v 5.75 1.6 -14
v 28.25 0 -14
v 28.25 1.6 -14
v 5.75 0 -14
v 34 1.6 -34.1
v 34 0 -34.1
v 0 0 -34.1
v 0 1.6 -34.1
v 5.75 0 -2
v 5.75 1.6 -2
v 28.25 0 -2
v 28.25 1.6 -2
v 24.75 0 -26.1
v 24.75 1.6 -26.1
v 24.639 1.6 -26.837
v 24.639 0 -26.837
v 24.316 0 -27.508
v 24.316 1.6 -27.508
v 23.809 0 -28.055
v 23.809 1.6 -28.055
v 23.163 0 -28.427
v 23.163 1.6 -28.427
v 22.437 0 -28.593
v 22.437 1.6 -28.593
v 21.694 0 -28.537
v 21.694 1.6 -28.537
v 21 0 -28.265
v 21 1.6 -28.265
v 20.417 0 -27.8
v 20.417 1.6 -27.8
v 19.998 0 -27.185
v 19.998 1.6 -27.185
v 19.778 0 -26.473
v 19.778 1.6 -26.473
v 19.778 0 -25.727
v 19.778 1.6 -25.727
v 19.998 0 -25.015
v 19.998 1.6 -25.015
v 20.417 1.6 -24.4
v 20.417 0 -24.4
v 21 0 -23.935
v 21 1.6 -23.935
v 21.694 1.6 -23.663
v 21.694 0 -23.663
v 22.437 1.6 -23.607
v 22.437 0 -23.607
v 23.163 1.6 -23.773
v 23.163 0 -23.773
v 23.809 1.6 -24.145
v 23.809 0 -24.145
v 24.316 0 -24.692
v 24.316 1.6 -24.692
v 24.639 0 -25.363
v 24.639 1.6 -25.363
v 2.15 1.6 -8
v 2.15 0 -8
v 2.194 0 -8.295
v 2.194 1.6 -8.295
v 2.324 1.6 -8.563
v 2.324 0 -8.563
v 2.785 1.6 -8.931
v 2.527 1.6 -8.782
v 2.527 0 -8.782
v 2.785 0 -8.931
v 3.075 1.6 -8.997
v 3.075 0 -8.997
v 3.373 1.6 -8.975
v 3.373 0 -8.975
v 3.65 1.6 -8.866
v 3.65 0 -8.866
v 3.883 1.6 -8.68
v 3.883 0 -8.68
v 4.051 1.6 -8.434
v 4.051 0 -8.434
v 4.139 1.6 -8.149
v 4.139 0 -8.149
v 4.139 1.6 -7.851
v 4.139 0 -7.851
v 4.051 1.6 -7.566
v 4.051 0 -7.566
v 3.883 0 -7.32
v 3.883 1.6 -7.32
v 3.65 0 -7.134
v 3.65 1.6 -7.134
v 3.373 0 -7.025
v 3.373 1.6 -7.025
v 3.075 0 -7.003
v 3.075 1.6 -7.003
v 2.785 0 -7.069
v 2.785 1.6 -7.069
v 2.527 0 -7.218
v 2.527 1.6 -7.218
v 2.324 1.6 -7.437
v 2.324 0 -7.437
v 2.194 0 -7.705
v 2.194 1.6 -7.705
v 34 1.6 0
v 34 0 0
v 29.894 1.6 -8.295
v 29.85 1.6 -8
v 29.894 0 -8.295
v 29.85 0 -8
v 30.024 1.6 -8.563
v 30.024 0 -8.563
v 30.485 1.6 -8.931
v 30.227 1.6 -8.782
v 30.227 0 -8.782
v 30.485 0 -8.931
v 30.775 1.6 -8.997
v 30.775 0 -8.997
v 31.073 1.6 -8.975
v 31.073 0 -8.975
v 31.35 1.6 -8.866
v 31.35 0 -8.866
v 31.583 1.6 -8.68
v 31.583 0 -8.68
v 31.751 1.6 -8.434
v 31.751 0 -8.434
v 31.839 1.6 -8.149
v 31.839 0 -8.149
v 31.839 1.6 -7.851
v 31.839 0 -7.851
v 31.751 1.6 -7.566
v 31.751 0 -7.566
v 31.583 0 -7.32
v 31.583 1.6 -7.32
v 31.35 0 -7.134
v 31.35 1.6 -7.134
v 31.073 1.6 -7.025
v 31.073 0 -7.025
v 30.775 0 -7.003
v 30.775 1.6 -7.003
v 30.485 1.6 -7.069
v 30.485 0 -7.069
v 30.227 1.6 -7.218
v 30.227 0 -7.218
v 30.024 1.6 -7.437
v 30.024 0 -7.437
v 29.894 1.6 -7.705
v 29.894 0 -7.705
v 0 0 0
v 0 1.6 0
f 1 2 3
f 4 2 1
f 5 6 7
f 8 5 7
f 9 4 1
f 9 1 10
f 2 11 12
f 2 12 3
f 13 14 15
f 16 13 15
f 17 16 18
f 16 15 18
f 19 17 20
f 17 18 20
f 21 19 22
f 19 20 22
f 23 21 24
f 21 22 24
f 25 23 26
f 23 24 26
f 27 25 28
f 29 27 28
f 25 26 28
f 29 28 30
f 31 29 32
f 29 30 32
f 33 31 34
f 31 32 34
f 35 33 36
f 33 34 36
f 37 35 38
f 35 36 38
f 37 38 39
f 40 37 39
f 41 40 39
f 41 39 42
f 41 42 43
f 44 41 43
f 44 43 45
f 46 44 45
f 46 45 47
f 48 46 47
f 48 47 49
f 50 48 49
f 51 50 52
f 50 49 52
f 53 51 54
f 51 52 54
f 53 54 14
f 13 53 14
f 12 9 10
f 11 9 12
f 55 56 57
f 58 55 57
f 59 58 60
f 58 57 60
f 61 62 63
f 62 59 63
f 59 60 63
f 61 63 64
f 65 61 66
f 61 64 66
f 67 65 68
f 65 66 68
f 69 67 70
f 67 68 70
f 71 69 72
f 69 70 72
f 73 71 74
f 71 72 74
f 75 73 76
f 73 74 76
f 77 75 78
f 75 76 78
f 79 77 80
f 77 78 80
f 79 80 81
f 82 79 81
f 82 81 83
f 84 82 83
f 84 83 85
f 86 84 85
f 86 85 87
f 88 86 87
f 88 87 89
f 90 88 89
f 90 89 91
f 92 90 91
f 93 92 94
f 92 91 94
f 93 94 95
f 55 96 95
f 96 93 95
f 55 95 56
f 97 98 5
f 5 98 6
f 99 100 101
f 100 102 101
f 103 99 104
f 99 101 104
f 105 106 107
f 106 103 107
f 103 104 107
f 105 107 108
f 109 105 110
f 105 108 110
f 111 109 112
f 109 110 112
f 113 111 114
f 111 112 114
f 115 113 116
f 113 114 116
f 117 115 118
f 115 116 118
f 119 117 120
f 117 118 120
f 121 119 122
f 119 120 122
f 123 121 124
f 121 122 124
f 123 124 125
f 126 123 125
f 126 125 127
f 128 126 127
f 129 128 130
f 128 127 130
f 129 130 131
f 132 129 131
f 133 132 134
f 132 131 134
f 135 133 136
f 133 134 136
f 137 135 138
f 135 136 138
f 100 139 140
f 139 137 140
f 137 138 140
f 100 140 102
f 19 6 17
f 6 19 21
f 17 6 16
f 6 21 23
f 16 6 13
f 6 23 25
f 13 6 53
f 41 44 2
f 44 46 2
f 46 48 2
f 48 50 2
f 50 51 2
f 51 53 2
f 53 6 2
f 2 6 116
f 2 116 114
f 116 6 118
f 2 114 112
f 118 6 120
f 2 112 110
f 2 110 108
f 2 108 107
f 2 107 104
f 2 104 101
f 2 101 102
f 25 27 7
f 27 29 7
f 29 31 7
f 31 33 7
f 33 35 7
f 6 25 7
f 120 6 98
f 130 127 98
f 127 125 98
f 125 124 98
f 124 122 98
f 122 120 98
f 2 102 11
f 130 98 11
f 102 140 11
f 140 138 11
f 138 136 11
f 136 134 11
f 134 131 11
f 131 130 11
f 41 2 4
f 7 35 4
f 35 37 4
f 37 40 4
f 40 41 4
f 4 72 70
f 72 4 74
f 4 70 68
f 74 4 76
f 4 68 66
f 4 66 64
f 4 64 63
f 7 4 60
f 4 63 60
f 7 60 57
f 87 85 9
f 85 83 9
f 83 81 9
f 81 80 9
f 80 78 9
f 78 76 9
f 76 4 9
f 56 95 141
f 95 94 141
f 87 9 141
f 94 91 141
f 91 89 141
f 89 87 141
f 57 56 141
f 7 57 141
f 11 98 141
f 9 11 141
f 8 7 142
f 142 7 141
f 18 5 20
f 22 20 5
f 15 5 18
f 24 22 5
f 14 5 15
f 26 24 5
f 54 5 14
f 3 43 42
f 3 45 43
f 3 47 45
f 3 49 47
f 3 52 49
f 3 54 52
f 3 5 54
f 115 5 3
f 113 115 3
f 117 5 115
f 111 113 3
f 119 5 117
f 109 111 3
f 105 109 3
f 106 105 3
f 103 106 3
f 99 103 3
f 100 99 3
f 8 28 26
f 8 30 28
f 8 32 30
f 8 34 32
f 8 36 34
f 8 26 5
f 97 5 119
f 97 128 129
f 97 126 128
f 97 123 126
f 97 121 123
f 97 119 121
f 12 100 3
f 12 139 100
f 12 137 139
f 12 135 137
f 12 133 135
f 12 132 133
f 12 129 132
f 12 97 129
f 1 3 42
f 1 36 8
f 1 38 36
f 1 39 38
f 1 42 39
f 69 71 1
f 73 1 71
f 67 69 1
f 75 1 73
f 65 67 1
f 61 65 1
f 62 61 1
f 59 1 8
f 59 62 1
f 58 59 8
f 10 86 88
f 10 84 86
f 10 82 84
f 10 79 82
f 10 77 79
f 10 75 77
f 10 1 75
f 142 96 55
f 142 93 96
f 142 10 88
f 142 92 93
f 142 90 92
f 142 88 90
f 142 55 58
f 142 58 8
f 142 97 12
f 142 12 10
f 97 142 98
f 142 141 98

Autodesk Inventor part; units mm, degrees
ref_plane "YZ Plane" through (0, 0, 0) normal (1, 0, 0) x (0, 1, 0)
ref_plane "XZ Plane" through (0, 0, 0) normal (0, 1, 0) x (-1, 0, 0)
ref_plane "XY Plane" through (0, 0, 0) normal (0, 0, 1) x (1, 0, 0)
sketch "Szkic1" plane through (0, 0, 0) normal (0, 1, 0) x (-1, 0, 0)
  line L0 (0, 0) -> (-34, 0)
  line L1 (-34, 0) -> (-34, -34.1)
  line L2 (-34, -34.1) -> (0, -34.1)
  line L3 (0, -34.1) -> (0, 0)
  line L4 (-5.75, -2) -> (-28.25, -2)
  line L5 (-28.25, -2) -> (-28.25, -14)
  line L6 (-28.25, -14) -> (-5.75, -14)
  line L7 (-5.75, -14) -> (-5.75, -2)
  circle A0 centre (-3.15, -8) radius 1
  circle A1 centre (-30.85, -8) radius 1
  dimension "d0" = 34
  dimension "d1" = 34.1
  dimension "d2" = 22.5
  dimension "d3" = 12
  dimension "d4" = 2
  dimension "d5" = 5.75
  dimension "d6" = 2
  dimension "d7" = 2.6
  dimension "d8" = 2
  dimension "d9" = 2.6
  dimension "d12" = 6
  dimension "d13" = 6
extrude "Wyciągnięcie proste1" add sketch "Szkic1" along normal blind 1.6
sketch "Szkic2" plane through (0, 1.6, 0) normal (0, 1, 0) x (1, 0, 0)
  circle A0 centre (22.25, 26.1) radius 2.5
  line L0 (34, 0) -> (34, 34.1) projected
  line L1 (34, 34.1) -> (0, 34.1) projected
  point P0 (0, 0)
  dimension "d14" = 5
  dimension "d15" = 11.75
  dimension "d16" = 8
extrude "Wyciągnięcie proste2" cut sketch "Szkic2" against normal blind 1.6
equation "\"d5\" = -0.5 * d2 + 0.5 * d0"
equation "\"d12\" = 0.5 * d3"
equation "\"d13\" = d12"
properties part number "mocowanie ostatniego serwa"
